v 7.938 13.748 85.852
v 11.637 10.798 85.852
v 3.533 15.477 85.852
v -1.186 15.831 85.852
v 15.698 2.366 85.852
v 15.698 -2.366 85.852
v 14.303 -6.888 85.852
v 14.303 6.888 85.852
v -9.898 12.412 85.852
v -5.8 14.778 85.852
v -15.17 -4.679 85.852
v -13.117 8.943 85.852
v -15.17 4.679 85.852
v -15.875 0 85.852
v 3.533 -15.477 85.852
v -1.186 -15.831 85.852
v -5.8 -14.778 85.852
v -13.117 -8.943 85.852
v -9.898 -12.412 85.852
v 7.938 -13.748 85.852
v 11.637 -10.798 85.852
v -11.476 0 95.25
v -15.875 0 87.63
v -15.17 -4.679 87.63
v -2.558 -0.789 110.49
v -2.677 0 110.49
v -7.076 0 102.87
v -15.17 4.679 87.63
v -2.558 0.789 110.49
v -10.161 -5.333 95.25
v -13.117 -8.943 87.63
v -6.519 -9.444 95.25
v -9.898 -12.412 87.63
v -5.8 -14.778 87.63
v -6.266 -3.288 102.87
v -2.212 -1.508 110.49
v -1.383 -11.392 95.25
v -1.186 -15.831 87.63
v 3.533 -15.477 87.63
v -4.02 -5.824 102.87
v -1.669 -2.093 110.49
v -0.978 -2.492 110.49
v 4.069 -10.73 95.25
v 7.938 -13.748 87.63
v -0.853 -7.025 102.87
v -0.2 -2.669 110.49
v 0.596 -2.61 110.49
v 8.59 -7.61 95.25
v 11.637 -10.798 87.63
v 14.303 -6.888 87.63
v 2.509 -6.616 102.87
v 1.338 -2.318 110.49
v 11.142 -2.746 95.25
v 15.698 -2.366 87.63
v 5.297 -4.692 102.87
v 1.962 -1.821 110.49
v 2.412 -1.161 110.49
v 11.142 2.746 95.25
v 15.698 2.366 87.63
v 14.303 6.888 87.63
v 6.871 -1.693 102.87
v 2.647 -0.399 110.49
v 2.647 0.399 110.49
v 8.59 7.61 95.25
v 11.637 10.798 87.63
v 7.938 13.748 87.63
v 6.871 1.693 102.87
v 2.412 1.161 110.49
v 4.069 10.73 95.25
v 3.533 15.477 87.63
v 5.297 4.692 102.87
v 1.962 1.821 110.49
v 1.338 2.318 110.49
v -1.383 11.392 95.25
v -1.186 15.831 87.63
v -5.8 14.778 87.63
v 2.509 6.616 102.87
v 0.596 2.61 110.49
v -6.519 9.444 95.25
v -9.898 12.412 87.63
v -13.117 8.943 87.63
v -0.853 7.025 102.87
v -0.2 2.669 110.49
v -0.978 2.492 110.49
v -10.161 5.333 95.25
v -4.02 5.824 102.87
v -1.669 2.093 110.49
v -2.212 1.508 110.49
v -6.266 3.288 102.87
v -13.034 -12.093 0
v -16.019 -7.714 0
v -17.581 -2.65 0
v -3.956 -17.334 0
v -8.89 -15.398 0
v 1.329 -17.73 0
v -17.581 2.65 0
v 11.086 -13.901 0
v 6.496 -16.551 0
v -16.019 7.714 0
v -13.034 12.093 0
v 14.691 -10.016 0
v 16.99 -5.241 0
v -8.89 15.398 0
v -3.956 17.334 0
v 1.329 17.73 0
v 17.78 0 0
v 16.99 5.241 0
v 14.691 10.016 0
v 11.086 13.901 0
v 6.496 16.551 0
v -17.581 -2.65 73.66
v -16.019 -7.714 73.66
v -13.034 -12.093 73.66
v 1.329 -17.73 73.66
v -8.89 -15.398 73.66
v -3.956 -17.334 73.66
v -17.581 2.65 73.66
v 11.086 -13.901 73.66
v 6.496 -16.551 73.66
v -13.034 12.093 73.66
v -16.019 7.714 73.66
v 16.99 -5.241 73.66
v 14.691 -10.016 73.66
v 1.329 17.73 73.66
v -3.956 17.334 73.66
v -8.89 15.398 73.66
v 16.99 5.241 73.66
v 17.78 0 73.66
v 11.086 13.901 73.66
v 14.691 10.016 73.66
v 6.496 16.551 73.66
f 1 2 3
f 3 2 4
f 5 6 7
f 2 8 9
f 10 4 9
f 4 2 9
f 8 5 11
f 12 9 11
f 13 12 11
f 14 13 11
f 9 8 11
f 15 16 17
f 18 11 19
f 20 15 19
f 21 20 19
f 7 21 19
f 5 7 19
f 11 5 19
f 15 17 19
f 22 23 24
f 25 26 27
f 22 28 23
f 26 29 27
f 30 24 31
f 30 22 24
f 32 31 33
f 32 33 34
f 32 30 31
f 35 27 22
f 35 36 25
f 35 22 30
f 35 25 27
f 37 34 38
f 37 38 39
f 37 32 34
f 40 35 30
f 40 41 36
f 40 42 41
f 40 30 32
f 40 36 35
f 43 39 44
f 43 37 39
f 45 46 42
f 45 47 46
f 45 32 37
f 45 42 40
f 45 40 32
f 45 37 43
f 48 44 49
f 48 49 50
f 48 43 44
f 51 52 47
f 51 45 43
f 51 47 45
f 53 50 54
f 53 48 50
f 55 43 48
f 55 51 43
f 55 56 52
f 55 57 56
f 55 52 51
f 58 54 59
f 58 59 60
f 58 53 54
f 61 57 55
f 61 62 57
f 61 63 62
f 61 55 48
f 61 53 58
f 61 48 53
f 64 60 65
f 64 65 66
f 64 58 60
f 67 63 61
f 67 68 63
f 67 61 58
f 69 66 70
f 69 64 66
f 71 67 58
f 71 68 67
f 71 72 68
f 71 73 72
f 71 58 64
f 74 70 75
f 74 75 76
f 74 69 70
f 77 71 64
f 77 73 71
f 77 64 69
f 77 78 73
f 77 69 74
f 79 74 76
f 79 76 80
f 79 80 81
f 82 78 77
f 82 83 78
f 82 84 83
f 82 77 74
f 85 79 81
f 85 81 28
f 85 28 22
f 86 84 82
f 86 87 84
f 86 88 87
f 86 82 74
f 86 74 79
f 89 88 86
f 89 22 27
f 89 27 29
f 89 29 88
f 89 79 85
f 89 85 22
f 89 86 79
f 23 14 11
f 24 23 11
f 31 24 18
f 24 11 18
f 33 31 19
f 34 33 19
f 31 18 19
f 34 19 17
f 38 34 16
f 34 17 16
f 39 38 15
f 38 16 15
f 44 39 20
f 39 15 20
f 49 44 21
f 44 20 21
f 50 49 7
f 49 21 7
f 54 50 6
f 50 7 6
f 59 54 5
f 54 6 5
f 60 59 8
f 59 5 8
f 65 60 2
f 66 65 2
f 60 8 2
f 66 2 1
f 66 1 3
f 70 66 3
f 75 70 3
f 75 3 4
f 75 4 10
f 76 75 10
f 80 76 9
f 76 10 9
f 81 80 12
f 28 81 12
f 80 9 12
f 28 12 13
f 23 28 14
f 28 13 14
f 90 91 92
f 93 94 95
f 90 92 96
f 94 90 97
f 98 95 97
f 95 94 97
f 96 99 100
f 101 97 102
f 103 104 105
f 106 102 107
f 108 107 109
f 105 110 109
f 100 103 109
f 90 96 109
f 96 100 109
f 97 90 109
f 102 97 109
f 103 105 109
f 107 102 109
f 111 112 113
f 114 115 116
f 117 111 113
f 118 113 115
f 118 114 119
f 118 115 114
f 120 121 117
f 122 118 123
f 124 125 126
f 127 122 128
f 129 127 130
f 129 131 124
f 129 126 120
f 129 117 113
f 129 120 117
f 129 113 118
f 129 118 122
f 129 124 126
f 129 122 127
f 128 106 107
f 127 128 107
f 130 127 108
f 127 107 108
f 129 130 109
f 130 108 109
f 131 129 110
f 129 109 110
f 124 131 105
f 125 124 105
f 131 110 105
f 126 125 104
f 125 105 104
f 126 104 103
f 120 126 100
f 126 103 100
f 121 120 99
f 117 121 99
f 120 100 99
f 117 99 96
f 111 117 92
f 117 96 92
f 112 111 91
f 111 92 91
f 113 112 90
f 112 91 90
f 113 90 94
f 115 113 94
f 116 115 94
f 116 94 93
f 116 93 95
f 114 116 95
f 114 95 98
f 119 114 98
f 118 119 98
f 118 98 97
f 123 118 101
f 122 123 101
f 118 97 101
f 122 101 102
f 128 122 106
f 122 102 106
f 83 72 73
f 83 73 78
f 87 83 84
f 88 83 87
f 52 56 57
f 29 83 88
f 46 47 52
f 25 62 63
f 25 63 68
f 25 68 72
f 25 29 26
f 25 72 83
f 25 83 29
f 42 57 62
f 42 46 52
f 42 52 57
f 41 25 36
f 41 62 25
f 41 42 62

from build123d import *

# Parameters (mm, degrees)
SKETCH1_R           = 17.78
BOSS_EXTRUDE1_DEPTH = 73.66
SKETCH2_R           = 15.875
BOSS_EXTRUDE2_DEPTH = 24.638
CHAMFER1_SIZE       = 22.86
CHAMFER1_SIZE2      = 13.198227154


with BuildPart() as part:
    # Sketch1 → Boss-Extrude1 (new body)
    with BuildSketch(Plane.XY):
        Circle(SKETCH1_R)
    extrude(amount=BOSS_EXTRUDE1_DEPTH)


with BuildPart() as body_2:
    # Sketch2 → Boss-Extrude2 (new body)
    with BuildSketch(Plane.XY.offset(85.852)):
        with Locations(Location((0, 0, 0), (0, 0, 180))):
            Circle(SKETCH2_R)
    extrude(amount=BOSS_EXTRUDE2_DEPTH)

    # Chamfer1
    chamfer1_edges = [body_2.edges().sort_by_distance(p)[0] for p in [
        (15.875, 0, 110.49),
    ]]
    chamfer1_side = [body_2.faces().sort_by_distance(p)[0] for p in [
        (15.875, 0, 98.171),
    ]]
    chamfer(chamfer1_edges, length=CHAMFER1_SIZE, length2=CHAMFER1_SIZE2, reference=chamfer1_side[0])


solid = Compound([part.part, body_2.part])
